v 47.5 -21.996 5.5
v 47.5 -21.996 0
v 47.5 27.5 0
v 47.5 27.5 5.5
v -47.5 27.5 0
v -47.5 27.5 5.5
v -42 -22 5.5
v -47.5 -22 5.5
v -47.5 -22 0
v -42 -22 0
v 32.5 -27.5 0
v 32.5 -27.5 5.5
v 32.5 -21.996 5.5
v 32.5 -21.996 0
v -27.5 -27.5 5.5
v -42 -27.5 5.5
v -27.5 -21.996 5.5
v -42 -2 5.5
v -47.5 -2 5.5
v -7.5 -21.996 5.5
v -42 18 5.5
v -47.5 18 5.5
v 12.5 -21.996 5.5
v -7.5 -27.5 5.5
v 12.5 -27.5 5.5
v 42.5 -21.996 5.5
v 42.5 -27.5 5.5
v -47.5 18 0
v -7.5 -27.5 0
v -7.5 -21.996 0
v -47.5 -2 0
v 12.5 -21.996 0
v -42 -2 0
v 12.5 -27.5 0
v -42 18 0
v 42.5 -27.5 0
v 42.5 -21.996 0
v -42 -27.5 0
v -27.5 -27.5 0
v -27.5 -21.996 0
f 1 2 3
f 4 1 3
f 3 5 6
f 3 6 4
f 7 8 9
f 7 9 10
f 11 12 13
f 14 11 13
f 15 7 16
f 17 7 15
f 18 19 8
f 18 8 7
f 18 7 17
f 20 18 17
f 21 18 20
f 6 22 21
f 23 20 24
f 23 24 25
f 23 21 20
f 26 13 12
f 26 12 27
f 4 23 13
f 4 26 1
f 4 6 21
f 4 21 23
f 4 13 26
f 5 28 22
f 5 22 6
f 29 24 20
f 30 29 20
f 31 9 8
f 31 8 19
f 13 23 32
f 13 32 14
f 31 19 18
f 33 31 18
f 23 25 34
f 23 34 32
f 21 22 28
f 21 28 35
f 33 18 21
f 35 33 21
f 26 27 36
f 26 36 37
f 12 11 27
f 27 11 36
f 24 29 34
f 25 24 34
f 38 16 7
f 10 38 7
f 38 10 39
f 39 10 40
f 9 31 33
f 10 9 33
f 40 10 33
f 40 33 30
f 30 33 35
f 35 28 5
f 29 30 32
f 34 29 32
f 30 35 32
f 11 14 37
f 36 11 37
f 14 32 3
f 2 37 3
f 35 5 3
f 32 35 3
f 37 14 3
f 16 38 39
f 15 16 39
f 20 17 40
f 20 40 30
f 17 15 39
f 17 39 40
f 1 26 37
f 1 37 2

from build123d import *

# Parameters (mm, degrees)
SKETCH_1_W          = 95
SKETCH_1_H          = 55
EXTRUDE_1_DEPTH     = 5.5
SKETCH_3_W          = 5.5
SKETCH_3_H          = 20
CUT_EXTRUDE_2_DEPTH = 56.161127617
SKETCH_4_W          = 20
SKETCH_4_H          = 5.504098133
SKETCH_4_W_2        = 5
CUT_EXTRUDE_3_DEPTH = 56.161127617


with BuildPart() as part:
    # ｽｹｯﾁ1 → ﾎﾞｽ - 押し出し1 (new body)
    with BuildSketch(Plane.XY):
        Rectangle(SKETCH_1_W, SKETCH_1_H)
    extrude(amount=EXTRUDE_1_DEPTH)

    # ｽｹｯﾁ3 → ｶｯﾄ - 押し出し2 (cut, through all)
    with BuildSketch(Plane.XY.offset(5.5)):
        with Locations((-44.75, -32)):
            Rectangle(SKETCH_3_W, SKETCH_3_H)
        with Locations((-44.75, 8)):
            Rectangle(SKETCH_3_W, SKETCH_3_H)
    extrude(amount=-CUT_EXTRUDE_2_DEPTH, mode=Mode.SUBTRACT)

    # ｽｹｯﾁ4 → ｶｯﾄ - 押し出し3 (cut, through all)
    with BuildSketch(Plane.XY.offset(5.5)):
        with Locations((-17.5, -24.747950934)):
            Rectangle(SKETCH_4_W, SKETCH_4_H)
        with Locations((22.5, -24.747950934)):
            Rectangle(SKETCH_4_W, SKETCH_4_H)
        with Locations((45, -24.747950934)):
            Rectangle(SKETCH_4_W_2, SKETCH_4_H)
    extrude(amount=-CUT_EXTRUDE_3_DEPTH, mode=Mode.SUBTRACT)


solid = part.part
